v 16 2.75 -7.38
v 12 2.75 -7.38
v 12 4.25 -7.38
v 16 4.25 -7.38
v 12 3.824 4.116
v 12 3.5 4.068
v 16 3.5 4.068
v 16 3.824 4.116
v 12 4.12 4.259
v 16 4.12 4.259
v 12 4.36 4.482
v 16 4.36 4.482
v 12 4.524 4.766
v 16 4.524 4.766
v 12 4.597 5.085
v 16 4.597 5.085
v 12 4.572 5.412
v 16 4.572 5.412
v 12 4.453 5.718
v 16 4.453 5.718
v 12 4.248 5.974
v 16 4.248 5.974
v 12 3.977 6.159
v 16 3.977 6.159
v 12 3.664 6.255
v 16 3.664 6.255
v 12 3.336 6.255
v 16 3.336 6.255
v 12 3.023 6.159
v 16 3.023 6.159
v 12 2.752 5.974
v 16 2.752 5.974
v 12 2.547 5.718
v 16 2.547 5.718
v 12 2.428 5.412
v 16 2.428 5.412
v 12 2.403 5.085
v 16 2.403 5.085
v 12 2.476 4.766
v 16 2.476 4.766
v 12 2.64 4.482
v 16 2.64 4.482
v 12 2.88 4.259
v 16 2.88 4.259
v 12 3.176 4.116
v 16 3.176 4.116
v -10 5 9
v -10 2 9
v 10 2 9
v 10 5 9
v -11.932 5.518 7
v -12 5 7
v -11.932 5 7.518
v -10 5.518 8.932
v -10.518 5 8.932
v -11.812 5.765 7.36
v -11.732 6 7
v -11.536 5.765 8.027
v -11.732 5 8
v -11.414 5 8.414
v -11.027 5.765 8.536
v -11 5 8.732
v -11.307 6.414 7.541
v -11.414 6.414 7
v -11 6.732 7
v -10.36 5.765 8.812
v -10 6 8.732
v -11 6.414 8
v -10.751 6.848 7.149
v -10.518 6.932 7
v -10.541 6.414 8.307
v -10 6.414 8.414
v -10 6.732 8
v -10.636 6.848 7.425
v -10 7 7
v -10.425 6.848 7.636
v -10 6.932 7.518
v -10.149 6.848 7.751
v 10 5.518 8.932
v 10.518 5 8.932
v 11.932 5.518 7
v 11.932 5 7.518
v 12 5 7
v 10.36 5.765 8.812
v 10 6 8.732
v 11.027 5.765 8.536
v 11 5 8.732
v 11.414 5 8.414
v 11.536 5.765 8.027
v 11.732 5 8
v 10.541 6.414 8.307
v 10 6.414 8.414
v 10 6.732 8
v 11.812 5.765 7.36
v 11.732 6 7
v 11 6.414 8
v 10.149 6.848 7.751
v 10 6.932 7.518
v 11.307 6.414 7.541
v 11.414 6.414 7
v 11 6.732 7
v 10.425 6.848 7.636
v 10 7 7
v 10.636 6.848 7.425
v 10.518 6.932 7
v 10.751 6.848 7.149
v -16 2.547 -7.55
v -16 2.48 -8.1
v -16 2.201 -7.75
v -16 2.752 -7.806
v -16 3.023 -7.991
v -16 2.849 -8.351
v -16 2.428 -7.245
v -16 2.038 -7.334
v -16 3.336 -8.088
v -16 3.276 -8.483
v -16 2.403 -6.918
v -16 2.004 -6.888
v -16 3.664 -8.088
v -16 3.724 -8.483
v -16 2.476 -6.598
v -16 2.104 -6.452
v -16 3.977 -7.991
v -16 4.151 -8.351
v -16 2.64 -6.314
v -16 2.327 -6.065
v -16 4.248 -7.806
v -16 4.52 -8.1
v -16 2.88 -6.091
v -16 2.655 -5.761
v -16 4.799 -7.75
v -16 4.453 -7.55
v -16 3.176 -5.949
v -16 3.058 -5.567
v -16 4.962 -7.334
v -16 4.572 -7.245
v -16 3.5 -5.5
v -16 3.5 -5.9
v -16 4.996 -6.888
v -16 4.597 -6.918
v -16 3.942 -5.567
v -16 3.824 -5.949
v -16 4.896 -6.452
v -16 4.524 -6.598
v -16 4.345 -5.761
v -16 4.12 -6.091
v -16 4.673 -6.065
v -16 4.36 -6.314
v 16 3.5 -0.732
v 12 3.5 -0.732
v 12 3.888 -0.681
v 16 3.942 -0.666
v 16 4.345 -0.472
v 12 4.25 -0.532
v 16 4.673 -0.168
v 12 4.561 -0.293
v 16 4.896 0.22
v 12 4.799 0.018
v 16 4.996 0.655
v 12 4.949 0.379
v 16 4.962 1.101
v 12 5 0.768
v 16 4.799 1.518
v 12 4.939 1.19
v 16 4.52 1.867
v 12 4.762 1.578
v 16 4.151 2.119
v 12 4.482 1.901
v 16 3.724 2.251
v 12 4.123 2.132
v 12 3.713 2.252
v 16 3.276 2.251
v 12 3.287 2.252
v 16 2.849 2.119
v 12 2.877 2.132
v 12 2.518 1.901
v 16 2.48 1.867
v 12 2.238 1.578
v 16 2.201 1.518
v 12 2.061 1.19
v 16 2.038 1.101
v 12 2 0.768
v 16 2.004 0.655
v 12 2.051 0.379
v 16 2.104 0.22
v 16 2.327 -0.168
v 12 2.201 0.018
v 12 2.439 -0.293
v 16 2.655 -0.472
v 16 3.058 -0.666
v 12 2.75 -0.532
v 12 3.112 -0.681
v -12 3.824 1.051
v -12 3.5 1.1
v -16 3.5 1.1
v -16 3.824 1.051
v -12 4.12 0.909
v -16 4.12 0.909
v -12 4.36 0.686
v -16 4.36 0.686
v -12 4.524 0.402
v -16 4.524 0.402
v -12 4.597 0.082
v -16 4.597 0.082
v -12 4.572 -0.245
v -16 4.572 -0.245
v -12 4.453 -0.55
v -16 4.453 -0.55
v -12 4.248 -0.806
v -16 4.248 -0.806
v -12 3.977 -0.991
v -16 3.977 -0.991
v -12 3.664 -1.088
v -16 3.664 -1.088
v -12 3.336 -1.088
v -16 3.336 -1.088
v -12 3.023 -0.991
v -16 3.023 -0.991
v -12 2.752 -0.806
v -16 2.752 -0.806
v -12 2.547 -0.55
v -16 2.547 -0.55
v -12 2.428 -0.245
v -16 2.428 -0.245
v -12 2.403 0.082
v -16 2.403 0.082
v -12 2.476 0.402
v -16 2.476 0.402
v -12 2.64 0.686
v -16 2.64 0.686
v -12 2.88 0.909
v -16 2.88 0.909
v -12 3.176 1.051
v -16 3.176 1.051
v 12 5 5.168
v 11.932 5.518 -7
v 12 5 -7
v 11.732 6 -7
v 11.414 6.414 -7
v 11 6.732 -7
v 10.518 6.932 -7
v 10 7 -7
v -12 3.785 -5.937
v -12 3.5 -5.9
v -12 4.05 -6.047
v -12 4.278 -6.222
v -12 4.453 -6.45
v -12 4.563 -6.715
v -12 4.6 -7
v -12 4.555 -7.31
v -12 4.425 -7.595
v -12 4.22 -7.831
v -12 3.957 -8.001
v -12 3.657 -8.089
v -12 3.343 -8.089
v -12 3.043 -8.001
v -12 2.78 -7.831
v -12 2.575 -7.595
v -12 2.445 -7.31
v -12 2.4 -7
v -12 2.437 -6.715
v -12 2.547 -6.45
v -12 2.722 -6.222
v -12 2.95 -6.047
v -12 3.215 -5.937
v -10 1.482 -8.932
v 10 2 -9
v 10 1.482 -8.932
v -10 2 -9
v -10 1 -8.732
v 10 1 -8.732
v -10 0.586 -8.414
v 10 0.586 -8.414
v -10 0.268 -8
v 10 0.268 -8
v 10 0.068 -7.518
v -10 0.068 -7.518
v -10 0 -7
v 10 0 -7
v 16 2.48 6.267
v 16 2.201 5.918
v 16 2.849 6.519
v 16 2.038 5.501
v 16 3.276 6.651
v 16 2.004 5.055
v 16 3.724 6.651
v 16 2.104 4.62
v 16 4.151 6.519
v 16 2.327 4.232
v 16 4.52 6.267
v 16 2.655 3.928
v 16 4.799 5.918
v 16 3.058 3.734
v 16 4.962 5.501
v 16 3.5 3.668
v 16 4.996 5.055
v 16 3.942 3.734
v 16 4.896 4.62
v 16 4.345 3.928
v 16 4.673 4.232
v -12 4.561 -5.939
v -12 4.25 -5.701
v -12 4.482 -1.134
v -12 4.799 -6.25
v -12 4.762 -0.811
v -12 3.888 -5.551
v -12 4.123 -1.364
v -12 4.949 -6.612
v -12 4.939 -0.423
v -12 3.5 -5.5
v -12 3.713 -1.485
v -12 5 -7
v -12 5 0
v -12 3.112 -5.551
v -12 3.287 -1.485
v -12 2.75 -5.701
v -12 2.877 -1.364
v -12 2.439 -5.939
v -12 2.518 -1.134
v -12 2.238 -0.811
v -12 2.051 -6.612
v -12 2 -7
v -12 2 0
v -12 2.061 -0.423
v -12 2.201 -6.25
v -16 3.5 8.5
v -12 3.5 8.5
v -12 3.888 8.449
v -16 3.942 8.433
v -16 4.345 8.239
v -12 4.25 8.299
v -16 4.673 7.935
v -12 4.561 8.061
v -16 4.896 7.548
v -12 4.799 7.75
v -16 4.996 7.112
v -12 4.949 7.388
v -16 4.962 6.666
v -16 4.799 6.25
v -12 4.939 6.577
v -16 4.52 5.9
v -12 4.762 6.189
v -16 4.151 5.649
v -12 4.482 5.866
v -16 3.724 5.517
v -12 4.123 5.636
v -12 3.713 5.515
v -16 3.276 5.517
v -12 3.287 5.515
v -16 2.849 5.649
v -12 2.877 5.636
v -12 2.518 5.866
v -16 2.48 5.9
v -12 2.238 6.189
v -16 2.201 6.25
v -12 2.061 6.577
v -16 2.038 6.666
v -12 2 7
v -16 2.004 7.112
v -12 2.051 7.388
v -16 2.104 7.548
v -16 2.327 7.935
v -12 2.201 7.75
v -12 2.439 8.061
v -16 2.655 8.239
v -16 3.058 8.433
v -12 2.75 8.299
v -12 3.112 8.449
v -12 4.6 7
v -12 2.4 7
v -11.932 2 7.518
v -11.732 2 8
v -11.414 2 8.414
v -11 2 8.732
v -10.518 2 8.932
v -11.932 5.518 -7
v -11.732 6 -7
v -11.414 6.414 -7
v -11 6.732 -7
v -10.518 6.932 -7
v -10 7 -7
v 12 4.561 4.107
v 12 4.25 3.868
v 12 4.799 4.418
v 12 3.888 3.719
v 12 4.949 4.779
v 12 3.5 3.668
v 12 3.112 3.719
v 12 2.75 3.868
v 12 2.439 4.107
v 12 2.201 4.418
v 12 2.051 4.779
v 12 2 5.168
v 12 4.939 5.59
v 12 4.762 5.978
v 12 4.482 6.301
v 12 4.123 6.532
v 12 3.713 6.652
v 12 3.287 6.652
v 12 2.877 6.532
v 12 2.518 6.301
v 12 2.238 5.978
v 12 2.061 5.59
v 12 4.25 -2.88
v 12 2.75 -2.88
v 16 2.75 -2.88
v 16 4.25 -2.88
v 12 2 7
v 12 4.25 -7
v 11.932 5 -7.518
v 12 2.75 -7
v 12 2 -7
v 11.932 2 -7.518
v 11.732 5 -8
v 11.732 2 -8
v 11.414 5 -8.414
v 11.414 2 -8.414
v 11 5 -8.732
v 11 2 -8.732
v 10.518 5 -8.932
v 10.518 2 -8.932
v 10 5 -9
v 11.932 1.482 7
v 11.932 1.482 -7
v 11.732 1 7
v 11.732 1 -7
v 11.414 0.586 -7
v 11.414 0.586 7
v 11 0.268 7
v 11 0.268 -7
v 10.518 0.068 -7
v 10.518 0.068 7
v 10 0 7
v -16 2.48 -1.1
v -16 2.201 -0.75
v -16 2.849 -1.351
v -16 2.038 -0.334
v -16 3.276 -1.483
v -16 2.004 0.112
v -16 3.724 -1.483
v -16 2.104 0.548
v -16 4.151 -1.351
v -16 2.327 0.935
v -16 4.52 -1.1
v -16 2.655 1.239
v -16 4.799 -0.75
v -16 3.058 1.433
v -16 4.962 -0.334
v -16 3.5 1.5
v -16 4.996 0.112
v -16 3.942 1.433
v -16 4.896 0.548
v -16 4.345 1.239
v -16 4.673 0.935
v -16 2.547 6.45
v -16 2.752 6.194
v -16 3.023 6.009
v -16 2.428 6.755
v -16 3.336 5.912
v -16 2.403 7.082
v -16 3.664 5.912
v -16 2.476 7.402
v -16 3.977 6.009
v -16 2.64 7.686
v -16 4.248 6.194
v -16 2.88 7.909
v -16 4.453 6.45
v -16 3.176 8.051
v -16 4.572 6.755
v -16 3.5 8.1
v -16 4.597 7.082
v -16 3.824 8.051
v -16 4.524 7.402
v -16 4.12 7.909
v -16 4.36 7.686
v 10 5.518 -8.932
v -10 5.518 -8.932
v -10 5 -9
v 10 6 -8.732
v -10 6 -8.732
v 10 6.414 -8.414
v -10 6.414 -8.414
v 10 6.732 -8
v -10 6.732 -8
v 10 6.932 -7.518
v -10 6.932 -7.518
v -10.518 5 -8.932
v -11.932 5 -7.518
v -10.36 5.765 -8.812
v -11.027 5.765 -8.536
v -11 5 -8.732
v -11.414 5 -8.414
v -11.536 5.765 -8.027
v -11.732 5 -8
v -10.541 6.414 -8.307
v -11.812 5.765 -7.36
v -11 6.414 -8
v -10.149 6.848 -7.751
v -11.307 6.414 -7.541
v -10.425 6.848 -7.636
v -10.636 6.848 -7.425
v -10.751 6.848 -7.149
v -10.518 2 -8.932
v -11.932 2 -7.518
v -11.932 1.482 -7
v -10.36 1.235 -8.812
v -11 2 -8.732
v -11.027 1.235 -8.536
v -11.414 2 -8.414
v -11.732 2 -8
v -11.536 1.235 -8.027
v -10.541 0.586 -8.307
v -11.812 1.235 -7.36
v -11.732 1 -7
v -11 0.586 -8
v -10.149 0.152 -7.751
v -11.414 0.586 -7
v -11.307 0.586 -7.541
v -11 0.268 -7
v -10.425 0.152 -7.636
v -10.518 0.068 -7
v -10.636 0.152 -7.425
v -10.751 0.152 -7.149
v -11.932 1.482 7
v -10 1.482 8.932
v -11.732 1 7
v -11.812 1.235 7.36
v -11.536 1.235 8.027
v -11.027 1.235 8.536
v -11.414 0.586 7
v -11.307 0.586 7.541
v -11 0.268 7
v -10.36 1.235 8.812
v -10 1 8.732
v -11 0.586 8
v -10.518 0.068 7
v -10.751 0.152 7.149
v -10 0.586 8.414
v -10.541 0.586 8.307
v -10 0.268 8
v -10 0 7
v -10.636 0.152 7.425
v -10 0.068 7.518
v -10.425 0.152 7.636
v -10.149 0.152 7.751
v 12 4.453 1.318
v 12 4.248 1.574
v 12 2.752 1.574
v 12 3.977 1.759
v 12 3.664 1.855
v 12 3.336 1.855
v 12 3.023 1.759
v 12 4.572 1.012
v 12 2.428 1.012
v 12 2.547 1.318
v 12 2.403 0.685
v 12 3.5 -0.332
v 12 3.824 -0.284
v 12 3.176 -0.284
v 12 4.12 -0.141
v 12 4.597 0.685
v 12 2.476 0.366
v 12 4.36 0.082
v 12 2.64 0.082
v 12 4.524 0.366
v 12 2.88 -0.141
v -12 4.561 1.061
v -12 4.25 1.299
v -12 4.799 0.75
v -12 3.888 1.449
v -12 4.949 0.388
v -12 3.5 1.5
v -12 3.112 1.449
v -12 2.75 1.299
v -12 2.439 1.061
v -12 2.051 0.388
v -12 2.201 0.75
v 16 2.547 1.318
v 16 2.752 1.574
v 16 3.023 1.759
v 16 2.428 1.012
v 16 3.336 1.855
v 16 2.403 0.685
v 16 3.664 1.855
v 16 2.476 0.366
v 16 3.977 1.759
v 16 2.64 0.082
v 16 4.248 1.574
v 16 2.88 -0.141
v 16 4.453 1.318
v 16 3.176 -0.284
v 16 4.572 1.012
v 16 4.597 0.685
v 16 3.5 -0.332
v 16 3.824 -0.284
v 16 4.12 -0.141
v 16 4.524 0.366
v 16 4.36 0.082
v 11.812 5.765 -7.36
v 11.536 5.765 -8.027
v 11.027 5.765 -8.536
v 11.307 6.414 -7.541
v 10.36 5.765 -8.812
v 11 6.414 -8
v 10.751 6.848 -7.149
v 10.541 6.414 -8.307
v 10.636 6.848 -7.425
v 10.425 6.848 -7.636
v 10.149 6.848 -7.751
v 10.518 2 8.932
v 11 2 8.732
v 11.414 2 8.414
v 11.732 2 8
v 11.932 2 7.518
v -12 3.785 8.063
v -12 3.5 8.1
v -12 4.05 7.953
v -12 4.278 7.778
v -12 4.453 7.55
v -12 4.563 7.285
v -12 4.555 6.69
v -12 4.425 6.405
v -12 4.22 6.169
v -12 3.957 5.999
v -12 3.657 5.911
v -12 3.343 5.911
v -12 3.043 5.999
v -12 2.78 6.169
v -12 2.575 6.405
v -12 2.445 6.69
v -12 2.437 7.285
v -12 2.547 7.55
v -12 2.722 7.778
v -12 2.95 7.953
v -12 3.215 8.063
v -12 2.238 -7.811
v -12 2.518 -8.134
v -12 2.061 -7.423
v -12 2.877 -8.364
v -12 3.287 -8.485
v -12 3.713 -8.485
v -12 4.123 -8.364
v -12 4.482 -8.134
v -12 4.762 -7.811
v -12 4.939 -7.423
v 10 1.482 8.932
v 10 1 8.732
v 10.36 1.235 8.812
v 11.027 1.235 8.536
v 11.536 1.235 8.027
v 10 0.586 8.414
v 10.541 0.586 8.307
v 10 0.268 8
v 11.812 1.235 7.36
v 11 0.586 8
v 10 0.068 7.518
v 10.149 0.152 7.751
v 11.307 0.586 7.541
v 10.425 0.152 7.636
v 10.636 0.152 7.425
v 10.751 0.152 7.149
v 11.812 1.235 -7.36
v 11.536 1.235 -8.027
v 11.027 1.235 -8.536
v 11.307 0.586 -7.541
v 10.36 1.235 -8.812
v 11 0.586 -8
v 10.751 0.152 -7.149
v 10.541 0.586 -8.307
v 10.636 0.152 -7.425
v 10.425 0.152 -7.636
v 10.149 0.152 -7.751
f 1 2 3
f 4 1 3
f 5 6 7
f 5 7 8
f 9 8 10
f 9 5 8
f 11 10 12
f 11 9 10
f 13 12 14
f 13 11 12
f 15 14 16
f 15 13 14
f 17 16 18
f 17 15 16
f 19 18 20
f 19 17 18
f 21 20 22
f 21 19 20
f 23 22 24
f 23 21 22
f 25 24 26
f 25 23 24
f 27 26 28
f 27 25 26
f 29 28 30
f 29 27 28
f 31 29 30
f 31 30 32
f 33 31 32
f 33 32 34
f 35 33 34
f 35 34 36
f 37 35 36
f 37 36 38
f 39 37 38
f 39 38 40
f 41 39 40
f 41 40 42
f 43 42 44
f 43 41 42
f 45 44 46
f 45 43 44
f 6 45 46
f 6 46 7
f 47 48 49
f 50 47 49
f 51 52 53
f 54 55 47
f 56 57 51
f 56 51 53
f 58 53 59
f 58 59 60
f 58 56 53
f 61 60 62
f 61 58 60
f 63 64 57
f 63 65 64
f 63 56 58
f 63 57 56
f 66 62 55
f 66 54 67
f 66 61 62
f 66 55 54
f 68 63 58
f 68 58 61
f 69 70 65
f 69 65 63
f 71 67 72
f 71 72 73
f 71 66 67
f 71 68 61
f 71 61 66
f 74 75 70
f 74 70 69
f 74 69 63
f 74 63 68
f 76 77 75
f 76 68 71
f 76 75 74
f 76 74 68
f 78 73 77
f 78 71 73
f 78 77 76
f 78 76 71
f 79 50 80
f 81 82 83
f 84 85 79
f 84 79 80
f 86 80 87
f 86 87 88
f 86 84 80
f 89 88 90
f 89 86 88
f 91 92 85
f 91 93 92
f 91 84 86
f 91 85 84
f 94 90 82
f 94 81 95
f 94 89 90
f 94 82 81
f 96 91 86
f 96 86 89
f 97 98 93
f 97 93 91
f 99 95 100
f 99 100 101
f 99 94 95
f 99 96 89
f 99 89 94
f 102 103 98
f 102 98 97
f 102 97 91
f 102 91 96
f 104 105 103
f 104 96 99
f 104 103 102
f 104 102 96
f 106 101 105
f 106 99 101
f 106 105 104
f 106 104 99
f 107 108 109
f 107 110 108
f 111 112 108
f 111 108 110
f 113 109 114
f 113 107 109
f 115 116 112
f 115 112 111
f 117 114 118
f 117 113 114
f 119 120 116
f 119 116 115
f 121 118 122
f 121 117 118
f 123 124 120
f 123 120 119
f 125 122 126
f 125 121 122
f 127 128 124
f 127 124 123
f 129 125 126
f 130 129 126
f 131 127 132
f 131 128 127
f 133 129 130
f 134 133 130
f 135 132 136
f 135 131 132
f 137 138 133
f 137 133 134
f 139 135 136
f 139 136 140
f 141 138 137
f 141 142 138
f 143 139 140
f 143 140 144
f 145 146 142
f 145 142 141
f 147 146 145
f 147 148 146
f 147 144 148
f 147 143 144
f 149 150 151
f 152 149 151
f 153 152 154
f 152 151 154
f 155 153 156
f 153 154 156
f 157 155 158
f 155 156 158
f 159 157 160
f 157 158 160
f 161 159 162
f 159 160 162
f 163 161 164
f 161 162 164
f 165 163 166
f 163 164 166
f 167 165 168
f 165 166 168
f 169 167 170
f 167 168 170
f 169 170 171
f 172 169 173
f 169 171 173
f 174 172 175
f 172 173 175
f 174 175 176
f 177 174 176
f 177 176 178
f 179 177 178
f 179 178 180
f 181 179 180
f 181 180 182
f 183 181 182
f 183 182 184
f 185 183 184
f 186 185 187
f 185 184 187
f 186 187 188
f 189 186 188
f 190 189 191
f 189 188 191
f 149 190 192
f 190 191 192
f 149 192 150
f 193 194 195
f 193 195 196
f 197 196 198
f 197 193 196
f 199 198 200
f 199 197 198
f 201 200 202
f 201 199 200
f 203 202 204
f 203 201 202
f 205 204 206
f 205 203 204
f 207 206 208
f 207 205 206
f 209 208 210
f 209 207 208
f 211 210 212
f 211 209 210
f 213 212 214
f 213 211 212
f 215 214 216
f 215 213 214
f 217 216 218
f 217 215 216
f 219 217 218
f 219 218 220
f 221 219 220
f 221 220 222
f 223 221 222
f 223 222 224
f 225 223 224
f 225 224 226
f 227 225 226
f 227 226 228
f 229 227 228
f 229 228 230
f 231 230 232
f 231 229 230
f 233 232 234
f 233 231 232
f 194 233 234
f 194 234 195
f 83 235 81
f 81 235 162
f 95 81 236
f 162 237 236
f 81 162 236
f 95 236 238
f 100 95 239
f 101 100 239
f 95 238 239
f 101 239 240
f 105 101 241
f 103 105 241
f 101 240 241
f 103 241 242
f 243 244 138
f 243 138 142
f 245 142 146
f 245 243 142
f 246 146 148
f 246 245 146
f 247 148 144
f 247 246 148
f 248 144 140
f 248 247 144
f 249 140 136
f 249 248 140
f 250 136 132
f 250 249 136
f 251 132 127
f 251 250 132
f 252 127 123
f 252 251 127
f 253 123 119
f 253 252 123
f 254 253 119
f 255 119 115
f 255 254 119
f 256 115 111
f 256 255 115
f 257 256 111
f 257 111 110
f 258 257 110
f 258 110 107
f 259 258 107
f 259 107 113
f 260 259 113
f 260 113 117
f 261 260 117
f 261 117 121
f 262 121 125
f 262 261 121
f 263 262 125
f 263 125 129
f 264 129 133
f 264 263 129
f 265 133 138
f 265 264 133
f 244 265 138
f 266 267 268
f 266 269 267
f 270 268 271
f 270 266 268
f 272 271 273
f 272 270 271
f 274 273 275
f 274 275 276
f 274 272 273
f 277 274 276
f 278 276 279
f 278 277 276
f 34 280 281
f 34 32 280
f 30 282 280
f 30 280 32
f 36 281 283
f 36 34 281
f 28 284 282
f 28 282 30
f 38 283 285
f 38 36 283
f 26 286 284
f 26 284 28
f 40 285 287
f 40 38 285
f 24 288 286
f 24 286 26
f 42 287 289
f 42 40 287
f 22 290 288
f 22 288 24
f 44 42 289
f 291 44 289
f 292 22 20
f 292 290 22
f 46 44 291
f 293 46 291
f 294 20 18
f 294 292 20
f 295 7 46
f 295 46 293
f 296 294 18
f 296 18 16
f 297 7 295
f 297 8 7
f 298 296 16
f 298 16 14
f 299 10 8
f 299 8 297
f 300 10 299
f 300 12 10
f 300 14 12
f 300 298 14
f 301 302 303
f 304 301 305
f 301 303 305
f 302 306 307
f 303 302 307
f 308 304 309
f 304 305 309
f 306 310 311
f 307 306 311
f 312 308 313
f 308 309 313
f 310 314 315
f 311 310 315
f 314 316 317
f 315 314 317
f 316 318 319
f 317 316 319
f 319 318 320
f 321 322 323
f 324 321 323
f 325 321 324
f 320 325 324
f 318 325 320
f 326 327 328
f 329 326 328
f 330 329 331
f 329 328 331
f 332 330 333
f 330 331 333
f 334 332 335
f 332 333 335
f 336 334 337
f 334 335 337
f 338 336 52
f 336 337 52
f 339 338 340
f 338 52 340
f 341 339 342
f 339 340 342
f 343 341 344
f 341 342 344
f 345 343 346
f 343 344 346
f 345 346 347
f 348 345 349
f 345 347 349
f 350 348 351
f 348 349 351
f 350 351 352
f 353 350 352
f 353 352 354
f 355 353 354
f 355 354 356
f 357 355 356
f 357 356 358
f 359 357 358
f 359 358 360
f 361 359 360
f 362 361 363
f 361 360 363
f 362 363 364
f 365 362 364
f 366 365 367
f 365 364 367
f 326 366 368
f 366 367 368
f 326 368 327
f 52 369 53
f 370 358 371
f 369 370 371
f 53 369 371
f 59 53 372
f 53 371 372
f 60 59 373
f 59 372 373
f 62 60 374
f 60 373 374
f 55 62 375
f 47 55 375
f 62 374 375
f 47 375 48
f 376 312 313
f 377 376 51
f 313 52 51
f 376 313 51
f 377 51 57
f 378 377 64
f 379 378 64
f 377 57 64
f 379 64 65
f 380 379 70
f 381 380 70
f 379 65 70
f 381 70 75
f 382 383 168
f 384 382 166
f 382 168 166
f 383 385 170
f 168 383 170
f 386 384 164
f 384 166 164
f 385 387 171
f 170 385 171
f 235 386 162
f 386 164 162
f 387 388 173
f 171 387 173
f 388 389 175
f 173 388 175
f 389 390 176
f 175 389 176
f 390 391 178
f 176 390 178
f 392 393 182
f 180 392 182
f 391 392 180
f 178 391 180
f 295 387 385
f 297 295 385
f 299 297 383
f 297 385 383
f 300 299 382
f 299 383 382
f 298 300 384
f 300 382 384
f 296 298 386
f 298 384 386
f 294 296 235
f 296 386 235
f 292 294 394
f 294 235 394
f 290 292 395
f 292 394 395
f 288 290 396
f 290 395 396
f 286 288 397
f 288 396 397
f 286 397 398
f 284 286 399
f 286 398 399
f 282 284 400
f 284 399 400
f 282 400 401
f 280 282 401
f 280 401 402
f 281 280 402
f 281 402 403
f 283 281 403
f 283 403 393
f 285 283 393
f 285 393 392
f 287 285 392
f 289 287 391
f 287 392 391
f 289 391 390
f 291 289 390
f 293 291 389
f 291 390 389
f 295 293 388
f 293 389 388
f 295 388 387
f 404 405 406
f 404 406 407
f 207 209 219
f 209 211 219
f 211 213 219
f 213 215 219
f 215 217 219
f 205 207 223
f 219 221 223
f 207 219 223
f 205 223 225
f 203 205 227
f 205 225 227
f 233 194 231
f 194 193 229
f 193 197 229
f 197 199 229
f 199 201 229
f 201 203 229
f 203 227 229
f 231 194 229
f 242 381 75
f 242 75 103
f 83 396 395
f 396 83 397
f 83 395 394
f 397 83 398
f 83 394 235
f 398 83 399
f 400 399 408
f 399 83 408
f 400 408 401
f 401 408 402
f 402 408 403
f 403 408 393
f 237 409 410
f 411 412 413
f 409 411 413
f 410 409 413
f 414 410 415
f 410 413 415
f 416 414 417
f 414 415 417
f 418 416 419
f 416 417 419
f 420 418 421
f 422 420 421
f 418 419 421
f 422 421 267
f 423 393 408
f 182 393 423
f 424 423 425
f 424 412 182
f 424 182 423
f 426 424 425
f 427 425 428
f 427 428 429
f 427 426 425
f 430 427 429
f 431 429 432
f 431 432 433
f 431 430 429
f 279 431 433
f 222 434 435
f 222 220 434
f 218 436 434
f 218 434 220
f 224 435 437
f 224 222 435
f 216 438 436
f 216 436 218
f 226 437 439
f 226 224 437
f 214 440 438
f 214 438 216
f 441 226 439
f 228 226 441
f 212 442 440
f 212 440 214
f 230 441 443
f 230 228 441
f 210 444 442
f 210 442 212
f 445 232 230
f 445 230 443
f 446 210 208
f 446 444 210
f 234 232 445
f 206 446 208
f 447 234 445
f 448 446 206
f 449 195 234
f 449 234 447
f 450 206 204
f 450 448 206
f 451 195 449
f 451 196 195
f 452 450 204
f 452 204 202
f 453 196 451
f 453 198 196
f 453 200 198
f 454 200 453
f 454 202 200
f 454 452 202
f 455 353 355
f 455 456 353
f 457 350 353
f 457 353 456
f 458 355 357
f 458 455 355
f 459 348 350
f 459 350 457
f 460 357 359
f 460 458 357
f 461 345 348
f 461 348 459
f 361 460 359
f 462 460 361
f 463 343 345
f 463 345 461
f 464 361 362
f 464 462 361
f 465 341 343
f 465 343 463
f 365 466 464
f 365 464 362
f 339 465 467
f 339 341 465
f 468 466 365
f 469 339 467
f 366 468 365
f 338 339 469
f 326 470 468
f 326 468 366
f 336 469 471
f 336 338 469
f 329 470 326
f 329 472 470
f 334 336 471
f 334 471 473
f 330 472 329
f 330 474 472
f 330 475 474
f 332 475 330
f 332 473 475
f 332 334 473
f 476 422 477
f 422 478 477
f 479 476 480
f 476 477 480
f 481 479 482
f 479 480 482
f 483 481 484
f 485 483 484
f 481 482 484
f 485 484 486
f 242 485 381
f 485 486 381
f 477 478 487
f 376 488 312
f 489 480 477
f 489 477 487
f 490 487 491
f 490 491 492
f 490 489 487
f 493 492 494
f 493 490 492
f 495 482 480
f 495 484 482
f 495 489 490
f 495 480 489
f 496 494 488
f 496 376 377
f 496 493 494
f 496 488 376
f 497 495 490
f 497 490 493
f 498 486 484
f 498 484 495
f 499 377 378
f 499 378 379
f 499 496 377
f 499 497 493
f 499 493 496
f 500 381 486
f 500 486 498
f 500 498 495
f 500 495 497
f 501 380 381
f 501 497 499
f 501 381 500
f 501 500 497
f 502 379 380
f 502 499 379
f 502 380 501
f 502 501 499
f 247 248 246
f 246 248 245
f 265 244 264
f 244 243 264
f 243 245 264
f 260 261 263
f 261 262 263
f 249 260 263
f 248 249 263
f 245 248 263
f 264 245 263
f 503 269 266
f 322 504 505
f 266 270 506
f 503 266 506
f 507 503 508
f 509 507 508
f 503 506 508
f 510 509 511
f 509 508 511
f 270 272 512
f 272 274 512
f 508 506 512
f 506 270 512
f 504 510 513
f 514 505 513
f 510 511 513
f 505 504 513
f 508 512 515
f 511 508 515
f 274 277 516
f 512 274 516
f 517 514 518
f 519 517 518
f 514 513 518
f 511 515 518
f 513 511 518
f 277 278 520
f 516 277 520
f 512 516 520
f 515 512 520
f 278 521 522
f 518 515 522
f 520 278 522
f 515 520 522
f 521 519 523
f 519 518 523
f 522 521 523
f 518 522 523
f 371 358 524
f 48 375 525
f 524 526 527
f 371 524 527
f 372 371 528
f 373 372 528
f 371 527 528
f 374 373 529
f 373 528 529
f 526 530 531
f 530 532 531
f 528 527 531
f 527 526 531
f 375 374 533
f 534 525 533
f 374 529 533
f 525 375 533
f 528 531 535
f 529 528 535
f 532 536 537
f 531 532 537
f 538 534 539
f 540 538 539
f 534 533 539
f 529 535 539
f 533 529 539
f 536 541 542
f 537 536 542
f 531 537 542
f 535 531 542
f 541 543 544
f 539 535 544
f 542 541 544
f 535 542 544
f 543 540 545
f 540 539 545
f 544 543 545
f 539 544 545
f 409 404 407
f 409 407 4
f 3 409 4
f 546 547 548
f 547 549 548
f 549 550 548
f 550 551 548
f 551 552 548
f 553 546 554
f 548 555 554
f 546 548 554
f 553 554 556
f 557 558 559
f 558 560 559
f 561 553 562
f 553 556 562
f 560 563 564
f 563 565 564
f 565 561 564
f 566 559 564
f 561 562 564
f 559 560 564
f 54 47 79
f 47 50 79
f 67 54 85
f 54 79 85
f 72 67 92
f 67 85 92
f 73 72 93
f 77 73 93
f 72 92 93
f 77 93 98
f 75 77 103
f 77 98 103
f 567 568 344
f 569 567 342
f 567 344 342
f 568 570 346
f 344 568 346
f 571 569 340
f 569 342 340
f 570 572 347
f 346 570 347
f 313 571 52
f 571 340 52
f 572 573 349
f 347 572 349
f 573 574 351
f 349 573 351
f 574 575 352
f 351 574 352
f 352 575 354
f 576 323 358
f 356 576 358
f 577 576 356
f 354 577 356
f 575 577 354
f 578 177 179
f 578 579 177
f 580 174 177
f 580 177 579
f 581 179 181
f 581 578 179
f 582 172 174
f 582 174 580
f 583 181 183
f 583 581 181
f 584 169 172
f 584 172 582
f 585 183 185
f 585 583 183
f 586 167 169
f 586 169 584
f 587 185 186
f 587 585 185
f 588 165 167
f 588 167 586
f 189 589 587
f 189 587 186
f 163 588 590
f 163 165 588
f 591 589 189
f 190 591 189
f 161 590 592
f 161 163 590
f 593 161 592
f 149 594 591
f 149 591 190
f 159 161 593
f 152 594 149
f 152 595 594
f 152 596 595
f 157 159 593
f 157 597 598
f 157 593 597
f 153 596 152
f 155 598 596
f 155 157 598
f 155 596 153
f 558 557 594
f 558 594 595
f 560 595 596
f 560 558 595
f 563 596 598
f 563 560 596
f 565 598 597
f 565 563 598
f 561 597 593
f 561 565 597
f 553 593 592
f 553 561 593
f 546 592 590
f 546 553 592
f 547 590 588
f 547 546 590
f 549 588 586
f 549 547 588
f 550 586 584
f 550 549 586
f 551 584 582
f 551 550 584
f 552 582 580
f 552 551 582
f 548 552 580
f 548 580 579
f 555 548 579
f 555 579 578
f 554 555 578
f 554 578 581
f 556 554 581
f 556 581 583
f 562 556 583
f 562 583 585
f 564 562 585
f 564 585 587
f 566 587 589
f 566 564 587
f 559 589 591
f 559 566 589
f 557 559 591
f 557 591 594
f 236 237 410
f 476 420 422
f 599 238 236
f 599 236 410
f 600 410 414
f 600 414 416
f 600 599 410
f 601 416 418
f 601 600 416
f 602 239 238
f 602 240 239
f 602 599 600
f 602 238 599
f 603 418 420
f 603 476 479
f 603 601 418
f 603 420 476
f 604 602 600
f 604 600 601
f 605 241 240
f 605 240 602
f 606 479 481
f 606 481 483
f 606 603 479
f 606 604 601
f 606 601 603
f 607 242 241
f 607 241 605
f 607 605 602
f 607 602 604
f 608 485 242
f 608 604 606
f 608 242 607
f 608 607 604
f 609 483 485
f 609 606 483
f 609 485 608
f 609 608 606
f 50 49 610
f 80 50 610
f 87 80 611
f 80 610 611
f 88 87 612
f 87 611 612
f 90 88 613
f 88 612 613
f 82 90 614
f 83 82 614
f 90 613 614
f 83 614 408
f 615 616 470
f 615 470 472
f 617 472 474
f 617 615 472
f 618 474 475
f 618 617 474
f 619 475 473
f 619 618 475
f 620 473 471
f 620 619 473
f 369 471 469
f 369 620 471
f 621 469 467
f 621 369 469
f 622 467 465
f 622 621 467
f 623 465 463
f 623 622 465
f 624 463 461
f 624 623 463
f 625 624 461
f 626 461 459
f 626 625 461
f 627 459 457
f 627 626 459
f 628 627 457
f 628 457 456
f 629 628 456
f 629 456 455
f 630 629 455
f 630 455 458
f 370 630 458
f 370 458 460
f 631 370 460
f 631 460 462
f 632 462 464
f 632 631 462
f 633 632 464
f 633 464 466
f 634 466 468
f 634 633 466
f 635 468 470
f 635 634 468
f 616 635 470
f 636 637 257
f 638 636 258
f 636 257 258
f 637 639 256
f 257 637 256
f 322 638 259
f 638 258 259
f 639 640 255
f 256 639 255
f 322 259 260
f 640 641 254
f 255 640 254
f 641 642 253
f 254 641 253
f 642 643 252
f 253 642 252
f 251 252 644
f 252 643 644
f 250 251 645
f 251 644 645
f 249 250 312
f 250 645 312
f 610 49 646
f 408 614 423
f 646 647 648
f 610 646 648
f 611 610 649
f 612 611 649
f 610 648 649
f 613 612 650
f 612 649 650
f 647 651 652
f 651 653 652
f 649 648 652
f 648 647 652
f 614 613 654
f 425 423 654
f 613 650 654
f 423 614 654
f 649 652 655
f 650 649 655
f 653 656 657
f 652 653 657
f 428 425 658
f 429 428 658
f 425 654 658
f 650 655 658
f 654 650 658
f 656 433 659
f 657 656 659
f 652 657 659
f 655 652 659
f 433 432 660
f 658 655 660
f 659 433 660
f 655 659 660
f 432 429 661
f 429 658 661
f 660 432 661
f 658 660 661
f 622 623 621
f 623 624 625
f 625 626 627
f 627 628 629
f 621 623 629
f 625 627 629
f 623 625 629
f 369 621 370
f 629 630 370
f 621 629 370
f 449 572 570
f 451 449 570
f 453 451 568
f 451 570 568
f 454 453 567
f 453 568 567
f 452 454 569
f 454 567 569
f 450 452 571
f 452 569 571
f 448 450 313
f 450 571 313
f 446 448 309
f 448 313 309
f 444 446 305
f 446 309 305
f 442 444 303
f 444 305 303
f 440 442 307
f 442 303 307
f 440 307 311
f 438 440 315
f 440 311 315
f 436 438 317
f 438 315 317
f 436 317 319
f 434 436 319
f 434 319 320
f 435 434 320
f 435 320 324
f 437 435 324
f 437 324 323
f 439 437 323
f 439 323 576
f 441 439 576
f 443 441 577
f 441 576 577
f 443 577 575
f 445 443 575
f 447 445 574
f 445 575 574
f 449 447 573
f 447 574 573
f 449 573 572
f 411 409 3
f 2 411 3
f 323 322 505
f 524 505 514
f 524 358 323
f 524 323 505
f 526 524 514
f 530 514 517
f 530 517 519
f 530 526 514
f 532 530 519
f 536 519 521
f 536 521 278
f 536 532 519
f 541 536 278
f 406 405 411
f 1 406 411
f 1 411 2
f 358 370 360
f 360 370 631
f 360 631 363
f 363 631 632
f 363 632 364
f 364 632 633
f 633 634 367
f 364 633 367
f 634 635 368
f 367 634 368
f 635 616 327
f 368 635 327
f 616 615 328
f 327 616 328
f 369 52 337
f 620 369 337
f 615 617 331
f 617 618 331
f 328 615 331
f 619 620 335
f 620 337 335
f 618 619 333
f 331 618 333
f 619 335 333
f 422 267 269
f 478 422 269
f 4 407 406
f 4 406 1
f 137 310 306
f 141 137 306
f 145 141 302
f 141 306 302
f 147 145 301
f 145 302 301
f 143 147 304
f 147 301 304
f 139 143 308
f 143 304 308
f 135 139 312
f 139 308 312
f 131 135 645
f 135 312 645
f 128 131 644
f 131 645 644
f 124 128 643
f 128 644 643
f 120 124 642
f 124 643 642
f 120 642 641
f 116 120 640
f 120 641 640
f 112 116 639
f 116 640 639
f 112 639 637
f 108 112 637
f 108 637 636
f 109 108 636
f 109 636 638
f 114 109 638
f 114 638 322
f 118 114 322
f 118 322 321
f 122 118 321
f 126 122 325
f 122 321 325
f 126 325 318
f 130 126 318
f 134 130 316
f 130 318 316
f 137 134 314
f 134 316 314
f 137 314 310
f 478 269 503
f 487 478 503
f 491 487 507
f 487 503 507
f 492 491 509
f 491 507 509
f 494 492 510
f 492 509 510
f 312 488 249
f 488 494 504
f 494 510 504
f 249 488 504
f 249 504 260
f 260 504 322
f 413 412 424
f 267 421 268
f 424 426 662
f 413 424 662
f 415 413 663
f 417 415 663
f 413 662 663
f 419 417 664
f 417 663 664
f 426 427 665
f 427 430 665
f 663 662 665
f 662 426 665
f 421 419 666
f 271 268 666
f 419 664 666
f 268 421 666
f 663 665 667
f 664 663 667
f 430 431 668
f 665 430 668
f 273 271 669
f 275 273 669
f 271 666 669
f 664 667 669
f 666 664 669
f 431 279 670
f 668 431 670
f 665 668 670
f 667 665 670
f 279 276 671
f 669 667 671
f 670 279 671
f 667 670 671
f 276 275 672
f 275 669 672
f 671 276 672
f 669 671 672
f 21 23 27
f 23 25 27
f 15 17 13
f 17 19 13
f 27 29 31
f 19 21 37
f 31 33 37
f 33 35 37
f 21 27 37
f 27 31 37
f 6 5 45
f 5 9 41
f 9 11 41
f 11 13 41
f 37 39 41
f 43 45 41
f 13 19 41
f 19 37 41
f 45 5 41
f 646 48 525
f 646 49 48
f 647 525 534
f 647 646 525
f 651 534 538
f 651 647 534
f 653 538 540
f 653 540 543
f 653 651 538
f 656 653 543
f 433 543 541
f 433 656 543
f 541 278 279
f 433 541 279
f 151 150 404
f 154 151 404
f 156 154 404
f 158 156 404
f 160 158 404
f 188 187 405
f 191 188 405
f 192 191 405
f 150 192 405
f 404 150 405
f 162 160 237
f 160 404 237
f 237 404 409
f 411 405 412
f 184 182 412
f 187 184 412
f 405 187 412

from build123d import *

# Parameters (mm, degrees)
BOSS_EXTRUDE1_DEPTH = 7
FILLET1_R           = 2
SKETCH2_R           = 1.5
SKETCH2_R_2         = 1.1
BOSS_EXTRUDE2_DEPTH = 4
SKETCH3_R           = 1.5
SKETCH3_R_2         = 1.1
SKETCH3_W           = 4.5
SKETCH3_H           = 1.5
BOSS_EXTRUDE3_DEPTH = 4


with BuildPart() as part:
    # Sketch1 → Boss-Extrude1 (new body)
    with BuildSketch(Plane(origin=(0, 0, 0), x_dir=(1, 0, 0), z_dir=(0, 1, 0))):
        with BuildLine():
            Line((-10, -9), (10, -9))
            ThreePointArc((10, -9), (11.414213562, -8.414213562), (12, -7))
            Line((12, -7), (12, 7))
            ThreePointArc((12, 7), (11.414213562, 8.414213562), (10, 9))
            Line((10, 9), (-10, 9))
            ThreePointArc((-10, 9), (-11.414213562, 8.414213562), (-12, 7))
            Line((-12, 7), (-12, -7))
            ThreePointArc((-12, -7), (-11.414213562, -8.414213562), (-10, -9))
        make_face()
    extrude(amount=BOSS_EXTRUDE1_DEPTH)

    # Fillet1
    fillet1_edges = [part.edges().sort_by_distance(p)[0] for p in [
        (12, 0, 0),
        (11.414213562, 0, 8.414213562),
        (0, 0, 9),
        (-11.414213562, 0, 8.414213562),
        (11.414213562, 7, 8.414213562),
        (12, 7, 0),
        (11.414213562, 7, -8.414213562),
        (0, 7, -9),
        (-11.414213562, 7, -8.414213562),
        (-12, 7, 0),
        (-11.414213562, 7, 8.414213562),
        (-12, 0, 0),
        (0, 7, 9),
        (-11.414213562, 0, -8.414213562),
        (0, 0, -9),
        (11.414213562, 0, -8.414213562),
    ]]
    fillet(fillet1_edges, radius=FILLET1_R)

    # Sketch2 → Boss-Extrude2 (add)
    with BuildSketch(Plane.ZY.offset(12)):
        with Locations((-7, 3.5)):
            Circle(SKETCH2_R)
        with Locations((-7, 3.5)):
            Circle(SKETCH2_R_2, mode=Mode.SUBTRACT)
        with Locations((0, 3.5)):
            Circle(SKETCH2_R)
        with Locations((0, 3.5)):
            Circle(SKETCH2_R_2, mode=Mode.SUBTRACT)
        with Locations((7, 3.5)):
            Circle(SKETCH2_R)
        with Locations((7, 3.5)):
            Circle(SKETCH2_R_2, mode=Mode.SUBTRACT)
    extrude(amount=BOSS_EXTRUDE2_DEPTH)

    # Sketch3 → Boss-Extrude3 (add)
    with BuildSketch(Plane(origin=(12, 0, 0), x_dir=(0, 0, -1), z_dir=(1, 0, 0))):
        with Locations((-5.167527067, 3.5)):
            Circle(SKETCH3_R)
        with Locations((-5.167527067, 3.5)):
            Circle(SKETCH3_R_2, mode=Mode.SUBTRACT)
        with Locations((-0.767527067, 3.5)):
            Circle(SKETCH3_R)
        with Locations((-0.767527067, 3.5)):
            Circle(SKETCH3_R_2, mode=Mode.SUBTRACT)
        with Locations((5.129819771, 3.5)):
            Rectangle(SKETCH3_W, SKETCH3_H)
    extrude(amount=BOSS_EXTRUDE3_DEPTH)


solid = part.part
